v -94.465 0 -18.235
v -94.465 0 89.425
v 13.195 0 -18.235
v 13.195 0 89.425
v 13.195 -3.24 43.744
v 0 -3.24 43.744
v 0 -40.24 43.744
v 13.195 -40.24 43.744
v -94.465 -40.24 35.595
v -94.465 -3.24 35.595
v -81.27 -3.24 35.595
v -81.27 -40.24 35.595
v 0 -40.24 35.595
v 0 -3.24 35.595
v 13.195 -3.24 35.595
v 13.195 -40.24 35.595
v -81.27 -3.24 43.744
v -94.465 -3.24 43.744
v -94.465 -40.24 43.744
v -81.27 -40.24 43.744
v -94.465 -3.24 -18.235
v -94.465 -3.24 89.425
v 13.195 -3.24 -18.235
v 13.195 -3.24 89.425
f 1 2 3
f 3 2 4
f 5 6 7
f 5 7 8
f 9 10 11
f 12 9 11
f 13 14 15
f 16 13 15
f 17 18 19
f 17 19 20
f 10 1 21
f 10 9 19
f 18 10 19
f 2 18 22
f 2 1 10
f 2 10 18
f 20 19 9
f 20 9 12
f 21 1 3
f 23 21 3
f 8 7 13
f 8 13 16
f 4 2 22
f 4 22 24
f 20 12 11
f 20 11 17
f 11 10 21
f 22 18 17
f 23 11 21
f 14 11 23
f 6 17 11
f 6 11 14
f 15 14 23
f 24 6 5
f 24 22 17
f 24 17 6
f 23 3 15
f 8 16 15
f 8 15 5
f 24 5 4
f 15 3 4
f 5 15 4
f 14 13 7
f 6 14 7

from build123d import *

# Parameters (mm, degrees)
F0_W     = 107.66001
F0_H     = 107.66
F1_DEPTH = 3.24
F2_W     = 13.195004
F2_H     = 8.148605
F3_DEPTH = 37


with BuildPart() as f1:
    # F0 (on Front) → F1 (new body)
    with BuildSketch(Plane.XZ):
        with Locations((-40.635001, 35.594998)):
            Rectangle(F0_W, F0_H)
    extrude(amount=F1_DEPTH)

    # F2 (on face) → F3 (join)
    with BuildSketch(Plane.XZ.offset(3.24)):
        with Locations((-87.867504, 39.6693)):
            Rectangle(F2_W, F2_H)
        with Locations((6.597502, 39.6693)):
            Rectangle(F2_W, F2_H)
    extrude(amount=F3_DEPTH)


solid = f1.part
